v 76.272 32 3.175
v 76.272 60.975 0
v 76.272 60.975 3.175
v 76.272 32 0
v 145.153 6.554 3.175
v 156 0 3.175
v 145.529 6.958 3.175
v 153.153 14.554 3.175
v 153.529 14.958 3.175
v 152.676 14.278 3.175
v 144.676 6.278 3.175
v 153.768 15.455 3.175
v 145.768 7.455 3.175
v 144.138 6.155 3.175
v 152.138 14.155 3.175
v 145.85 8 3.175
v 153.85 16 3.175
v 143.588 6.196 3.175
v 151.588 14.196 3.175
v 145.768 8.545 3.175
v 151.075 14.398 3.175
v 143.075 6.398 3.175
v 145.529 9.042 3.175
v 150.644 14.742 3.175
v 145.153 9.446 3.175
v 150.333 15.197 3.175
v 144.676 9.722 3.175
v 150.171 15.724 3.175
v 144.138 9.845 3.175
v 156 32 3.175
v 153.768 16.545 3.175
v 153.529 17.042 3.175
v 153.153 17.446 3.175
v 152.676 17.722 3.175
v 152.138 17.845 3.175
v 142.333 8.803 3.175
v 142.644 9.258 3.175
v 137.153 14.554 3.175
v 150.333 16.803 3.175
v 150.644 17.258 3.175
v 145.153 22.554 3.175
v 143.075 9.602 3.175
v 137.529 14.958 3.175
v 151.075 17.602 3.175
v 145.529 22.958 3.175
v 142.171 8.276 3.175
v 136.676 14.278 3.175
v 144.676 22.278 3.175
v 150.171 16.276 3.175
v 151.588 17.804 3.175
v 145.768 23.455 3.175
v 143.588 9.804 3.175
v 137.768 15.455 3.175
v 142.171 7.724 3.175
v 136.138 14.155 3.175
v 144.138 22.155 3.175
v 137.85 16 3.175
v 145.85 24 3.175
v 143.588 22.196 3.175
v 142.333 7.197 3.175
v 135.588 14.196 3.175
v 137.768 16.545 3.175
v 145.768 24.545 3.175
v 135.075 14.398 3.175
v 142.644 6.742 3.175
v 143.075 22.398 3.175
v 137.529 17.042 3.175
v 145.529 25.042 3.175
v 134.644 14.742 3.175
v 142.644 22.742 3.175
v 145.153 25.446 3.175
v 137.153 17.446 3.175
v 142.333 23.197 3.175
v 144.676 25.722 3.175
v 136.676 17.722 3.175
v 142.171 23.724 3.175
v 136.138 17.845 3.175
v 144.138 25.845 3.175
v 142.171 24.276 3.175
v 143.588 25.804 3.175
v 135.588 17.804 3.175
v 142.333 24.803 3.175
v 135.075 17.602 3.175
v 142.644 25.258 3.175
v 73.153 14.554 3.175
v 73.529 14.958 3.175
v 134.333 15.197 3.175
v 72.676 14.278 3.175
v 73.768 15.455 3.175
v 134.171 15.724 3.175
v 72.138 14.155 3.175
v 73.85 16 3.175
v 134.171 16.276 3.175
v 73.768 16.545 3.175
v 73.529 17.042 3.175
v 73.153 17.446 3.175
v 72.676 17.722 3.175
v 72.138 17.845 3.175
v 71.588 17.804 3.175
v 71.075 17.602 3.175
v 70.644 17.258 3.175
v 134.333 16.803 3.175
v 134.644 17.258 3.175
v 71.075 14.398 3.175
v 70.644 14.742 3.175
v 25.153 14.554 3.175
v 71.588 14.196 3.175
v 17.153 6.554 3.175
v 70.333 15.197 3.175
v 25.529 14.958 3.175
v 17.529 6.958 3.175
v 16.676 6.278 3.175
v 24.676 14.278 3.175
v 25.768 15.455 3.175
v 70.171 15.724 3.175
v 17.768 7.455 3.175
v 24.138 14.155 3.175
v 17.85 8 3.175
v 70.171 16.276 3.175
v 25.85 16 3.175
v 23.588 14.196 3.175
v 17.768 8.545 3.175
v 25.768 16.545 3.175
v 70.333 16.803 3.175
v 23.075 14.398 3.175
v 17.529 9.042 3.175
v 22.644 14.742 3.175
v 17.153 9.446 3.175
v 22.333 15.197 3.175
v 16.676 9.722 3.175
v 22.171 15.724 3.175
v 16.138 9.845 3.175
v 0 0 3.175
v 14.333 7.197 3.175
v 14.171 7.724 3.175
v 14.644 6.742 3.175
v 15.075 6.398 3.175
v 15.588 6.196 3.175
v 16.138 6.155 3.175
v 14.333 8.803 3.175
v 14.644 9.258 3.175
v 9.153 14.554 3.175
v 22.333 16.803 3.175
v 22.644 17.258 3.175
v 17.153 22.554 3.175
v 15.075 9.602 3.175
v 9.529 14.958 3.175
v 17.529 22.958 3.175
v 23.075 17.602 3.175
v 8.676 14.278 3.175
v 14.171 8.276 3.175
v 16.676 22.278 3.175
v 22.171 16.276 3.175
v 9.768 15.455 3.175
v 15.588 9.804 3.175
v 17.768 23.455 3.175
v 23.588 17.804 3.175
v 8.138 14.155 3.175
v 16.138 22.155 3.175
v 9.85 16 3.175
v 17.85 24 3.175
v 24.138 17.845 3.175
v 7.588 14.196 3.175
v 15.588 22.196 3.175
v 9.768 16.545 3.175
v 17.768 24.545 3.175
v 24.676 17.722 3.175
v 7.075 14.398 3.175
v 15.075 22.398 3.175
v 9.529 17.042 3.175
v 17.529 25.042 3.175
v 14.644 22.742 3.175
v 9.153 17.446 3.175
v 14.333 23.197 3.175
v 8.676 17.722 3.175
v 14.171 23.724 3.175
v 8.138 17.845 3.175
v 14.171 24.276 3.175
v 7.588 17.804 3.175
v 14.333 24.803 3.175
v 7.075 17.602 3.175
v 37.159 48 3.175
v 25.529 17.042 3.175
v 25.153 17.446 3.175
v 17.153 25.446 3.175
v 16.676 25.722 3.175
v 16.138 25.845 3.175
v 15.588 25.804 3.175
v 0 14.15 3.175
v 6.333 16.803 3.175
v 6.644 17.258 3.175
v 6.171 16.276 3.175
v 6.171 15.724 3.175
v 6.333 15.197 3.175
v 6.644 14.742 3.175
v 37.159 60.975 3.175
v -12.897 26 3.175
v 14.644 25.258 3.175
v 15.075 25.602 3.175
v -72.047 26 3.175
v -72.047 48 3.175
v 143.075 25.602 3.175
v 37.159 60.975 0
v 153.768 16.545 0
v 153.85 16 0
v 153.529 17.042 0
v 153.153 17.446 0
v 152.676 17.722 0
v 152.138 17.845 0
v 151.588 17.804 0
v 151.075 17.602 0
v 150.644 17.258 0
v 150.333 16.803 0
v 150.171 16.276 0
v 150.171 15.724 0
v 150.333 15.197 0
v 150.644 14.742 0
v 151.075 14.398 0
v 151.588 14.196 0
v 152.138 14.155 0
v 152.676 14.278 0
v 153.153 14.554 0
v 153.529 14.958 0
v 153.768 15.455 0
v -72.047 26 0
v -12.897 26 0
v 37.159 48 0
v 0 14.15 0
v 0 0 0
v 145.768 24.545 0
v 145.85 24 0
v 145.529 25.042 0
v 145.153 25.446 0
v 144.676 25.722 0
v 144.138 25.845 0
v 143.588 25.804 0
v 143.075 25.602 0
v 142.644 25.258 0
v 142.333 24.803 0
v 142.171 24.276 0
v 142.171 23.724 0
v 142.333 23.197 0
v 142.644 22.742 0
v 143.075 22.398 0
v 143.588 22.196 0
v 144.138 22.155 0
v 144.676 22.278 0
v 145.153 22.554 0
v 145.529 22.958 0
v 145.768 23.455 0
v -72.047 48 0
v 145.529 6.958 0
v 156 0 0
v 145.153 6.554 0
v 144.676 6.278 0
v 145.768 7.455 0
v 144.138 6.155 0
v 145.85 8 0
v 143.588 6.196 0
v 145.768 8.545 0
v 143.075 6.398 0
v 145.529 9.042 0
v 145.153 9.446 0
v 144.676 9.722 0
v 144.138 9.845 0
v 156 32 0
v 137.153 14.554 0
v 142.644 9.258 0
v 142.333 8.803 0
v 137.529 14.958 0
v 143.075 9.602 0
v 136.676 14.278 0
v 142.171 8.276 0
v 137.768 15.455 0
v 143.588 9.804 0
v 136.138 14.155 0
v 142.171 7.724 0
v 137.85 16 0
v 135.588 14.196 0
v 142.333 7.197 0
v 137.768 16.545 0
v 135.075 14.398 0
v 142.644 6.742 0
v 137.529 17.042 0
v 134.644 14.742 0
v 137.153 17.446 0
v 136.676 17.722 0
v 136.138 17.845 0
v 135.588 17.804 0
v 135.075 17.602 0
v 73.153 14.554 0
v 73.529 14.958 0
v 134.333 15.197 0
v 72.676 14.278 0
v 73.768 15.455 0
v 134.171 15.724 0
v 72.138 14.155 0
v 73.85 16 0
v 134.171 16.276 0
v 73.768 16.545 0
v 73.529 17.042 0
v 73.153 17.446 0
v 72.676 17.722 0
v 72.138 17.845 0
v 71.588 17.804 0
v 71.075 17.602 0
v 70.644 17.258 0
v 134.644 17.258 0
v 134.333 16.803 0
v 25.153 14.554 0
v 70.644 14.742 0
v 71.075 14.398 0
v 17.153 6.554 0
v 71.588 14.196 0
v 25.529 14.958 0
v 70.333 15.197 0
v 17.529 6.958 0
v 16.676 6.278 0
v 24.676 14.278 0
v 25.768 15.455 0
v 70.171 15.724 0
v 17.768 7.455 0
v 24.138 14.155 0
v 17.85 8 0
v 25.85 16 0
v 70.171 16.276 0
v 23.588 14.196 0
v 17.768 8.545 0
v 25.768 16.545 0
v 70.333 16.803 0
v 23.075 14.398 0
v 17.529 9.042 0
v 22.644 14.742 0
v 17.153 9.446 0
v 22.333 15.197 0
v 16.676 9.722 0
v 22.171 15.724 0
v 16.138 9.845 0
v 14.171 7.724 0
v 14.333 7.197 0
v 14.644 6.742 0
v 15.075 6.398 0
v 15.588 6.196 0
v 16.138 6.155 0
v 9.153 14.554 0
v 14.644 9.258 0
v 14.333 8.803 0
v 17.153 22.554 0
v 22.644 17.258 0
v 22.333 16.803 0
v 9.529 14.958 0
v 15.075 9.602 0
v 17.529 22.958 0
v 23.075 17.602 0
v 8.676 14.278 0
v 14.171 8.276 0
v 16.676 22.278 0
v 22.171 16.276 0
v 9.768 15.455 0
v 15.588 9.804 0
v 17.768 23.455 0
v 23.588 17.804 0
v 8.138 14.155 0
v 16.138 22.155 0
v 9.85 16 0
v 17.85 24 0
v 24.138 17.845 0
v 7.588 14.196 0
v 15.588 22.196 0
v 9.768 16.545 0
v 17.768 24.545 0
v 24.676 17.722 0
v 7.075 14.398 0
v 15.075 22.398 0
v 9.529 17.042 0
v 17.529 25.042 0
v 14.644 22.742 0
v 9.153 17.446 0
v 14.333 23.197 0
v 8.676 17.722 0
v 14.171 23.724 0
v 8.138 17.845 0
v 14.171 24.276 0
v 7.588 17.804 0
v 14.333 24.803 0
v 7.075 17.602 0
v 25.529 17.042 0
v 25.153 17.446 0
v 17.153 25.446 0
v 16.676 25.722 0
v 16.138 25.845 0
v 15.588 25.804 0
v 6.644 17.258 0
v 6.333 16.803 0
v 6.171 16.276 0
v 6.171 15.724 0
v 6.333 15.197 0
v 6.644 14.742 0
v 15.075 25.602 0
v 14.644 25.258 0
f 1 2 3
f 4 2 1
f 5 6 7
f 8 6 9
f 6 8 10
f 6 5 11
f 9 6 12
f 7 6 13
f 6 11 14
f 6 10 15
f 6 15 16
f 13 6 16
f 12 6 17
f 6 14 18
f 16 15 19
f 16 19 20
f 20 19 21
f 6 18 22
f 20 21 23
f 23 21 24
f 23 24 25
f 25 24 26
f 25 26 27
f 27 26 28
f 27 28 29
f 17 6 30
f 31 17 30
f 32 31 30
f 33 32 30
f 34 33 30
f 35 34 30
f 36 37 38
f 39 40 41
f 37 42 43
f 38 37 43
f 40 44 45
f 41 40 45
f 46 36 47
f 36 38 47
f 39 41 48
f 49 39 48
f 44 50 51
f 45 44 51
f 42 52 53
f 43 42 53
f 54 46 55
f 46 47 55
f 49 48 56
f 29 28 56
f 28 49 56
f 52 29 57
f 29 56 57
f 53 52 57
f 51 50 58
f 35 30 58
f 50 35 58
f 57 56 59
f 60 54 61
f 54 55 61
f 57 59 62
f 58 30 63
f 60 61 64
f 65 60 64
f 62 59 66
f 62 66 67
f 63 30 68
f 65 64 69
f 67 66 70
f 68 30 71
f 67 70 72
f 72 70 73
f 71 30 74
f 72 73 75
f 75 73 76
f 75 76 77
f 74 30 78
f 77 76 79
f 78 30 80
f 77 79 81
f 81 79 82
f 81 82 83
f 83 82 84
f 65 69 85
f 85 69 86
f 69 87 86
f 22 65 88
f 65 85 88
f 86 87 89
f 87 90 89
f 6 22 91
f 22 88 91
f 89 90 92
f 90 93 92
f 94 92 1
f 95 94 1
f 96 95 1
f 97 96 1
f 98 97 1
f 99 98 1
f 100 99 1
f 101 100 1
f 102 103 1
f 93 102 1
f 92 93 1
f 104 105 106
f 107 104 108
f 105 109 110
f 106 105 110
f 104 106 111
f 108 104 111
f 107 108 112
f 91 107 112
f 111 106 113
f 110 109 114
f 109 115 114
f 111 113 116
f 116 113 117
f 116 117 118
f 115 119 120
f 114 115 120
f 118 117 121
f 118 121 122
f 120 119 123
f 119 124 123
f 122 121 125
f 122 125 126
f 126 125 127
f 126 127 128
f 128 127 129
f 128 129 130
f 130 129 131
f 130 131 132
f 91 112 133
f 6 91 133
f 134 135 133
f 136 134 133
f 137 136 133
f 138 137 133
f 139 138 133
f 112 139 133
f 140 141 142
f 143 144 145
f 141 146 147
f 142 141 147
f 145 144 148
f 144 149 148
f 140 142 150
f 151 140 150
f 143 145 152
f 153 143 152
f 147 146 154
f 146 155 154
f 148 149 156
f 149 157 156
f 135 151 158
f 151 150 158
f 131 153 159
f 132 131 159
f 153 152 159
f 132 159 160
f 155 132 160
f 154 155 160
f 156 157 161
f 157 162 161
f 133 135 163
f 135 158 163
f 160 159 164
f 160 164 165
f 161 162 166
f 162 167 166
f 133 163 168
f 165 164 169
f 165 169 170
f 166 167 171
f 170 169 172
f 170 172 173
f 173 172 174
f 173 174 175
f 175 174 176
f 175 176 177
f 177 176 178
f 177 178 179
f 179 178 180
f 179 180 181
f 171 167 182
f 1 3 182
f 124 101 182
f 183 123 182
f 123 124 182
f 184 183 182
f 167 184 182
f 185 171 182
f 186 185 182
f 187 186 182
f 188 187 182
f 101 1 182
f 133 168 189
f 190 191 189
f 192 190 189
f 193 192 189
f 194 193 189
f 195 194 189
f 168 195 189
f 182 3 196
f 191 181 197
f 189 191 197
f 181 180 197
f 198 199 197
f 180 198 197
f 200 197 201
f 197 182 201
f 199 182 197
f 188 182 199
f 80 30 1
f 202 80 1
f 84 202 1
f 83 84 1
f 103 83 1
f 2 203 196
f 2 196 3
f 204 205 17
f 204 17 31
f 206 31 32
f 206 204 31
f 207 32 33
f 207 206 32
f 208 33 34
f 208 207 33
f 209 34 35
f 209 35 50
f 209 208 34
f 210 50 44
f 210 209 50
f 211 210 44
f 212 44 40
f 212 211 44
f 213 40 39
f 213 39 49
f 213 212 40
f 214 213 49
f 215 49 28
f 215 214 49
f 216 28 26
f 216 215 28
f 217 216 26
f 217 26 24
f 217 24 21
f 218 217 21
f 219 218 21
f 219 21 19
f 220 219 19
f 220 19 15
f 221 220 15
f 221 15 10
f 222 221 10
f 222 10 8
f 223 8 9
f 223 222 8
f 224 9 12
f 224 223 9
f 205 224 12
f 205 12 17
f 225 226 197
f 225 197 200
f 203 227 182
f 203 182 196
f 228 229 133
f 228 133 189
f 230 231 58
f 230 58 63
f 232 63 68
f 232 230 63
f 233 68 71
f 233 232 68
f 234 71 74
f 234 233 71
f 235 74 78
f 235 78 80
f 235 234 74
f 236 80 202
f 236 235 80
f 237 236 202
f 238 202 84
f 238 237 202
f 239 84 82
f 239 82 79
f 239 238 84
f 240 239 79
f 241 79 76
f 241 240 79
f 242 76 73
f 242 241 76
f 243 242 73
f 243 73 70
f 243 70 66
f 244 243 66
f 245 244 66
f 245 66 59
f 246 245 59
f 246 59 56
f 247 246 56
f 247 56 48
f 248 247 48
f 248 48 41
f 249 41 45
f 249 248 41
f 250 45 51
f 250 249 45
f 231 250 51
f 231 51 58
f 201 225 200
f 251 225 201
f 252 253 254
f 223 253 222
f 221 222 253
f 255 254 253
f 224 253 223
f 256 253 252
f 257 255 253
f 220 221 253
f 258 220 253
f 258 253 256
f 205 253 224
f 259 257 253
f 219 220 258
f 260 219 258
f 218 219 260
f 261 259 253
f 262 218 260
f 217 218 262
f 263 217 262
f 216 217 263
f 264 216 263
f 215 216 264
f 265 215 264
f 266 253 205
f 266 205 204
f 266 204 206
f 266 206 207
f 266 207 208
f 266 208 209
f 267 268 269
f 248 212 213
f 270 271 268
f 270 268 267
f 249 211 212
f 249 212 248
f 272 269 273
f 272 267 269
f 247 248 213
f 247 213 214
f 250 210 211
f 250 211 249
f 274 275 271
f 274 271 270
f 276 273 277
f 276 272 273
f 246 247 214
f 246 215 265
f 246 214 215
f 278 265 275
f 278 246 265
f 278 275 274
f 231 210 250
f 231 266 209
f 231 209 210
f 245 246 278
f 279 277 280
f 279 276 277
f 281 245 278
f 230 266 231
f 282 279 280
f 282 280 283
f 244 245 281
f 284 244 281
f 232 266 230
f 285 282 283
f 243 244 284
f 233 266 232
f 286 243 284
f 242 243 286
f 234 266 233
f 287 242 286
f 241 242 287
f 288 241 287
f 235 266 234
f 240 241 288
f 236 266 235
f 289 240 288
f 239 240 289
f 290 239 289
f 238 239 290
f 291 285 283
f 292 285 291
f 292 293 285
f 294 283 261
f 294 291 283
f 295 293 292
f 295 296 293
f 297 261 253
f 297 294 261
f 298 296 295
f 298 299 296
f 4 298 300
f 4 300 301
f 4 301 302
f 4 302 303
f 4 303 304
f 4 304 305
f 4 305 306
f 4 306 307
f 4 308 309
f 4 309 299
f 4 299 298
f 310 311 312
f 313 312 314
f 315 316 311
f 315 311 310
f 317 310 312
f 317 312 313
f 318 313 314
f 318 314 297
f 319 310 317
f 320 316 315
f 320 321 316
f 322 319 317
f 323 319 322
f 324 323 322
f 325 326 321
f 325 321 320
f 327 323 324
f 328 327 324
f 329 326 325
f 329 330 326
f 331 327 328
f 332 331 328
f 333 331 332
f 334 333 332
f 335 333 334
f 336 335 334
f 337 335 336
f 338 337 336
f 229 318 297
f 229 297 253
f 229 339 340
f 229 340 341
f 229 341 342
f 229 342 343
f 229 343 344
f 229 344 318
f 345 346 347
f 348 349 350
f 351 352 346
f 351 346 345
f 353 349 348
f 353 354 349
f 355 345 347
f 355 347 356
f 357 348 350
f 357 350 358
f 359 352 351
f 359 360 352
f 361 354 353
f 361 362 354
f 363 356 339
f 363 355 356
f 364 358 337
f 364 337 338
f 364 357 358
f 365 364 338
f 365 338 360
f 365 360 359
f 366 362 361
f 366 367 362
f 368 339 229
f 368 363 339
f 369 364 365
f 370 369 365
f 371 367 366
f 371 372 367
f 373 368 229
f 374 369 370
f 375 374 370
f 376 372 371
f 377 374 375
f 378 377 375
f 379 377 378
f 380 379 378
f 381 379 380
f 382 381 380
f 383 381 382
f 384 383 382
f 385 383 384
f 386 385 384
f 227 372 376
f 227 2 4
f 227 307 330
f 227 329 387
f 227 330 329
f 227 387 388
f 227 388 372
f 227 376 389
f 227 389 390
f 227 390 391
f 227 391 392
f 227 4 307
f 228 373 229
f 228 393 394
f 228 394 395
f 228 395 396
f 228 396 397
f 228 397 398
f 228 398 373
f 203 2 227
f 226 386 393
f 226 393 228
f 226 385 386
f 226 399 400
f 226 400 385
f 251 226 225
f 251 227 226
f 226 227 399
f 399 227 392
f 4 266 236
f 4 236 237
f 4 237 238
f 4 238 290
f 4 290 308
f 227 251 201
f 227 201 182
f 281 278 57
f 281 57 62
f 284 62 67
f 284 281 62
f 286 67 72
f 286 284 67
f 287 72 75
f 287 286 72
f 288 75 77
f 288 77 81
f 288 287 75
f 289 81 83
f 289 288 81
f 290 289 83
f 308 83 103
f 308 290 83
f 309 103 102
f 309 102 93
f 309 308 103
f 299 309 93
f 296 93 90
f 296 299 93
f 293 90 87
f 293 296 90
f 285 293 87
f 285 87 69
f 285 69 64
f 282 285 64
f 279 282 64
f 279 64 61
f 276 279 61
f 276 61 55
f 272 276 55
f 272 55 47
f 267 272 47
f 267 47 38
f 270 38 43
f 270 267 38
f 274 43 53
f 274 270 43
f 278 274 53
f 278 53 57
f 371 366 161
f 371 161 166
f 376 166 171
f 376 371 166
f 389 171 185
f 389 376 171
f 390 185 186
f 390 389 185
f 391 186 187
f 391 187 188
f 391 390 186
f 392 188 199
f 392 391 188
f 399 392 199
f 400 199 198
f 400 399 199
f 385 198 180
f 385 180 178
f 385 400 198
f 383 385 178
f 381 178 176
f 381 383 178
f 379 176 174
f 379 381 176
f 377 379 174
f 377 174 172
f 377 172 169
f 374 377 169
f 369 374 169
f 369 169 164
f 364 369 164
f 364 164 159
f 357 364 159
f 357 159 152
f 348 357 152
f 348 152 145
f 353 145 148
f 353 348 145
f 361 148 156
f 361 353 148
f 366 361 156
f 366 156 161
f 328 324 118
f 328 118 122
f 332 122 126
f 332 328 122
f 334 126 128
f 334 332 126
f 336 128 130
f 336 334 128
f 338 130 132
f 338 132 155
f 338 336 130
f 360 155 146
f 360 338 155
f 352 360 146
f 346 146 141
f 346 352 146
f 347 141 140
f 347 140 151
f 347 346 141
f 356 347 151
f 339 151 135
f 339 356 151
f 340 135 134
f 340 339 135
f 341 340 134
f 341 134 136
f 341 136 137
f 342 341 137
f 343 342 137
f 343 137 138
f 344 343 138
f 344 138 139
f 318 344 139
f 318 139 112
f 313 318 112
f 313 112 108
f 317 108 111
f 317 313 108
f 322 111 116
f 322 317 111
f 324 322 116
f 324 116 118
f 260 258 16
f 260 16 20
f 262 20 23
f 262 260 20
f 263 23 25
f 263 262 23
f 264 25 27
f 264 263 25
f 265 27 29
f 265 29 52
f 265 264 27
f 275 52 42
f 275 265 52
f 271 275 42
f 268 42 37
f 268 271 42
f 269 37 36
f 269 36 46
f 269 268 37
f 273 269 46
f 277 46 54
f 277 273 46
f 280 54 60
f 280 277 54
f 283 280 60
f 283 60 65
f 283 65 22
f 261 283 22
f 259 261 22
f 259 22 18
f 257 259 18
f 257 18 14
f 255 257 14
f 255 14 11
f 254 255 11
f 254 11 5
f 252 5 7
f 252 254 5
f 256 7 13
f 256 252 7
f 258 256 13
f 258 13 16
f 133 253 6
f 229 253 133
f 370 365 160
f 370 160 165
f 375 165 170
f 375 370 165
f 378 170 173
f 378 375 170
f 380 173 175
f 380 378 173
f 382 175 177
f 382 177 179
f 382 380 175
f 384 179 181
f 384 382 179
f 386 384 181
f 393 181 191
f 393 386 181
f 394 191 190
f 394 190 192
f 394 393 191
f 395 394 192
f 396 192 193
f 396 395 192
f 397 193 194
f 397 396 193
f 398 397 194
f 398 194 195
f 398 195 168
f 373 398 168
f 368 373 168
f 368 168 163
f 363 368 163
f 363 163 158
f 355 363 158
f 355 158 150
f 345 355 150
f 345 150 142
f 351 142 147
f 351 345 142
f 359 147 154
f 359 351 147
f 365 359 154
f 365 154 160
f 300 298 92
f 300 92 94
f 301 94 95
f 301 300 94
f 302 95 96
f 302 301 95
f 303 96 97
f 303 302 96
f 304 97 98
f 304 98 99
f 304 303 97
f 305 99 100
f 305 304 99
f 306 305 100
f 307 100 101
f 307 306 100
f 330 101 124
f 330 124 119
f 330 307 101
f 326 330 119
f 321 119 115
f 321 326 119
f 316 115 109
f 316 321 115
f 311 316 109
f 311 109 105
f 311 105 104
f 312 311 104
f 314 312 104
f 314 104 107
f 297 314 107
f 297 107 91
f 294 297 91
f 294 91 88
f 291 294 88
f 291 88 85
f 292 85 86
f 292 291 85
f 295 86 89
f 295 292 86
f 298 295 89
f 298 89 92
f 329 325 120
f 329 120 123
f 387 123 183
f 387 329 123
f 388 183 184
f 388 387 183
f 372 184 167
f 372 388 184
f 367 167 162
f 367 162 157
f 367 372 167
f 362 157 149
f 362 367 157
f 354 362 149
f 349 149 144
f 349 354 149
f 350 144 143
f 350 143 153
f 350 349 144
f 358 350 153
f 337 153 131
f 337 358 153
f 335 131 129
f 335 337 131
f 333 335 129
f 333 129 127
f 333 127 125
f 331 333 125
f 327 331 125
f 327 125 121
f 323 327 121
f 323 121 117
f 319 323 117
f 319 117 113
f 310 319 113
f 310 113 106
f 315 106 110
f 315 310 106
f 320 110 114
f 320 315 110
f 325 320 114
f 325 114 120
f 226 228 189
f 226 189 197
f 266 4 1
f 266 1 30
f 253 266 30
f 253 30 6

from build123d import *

# Parameters (mm, degrees)
SKETCH1_R           = 1.85
BOSS_EXTRUDE1_DEPTH = 3.175


with BuildPart() as part:
    # Sketch1 → Boss-Extrude1 (new body)
    with BuildSketch(Plane.XY):
        Polygon((156, 0), (0, 0), (0, 14.15), (-12.897437159, 26), (-72.0466, 26), (-72.0466, 48), (37.159, 48), (37.159, 60.975), (76.2722, 60.975), (76.2722, 32), (156, 32), align=None)
        with Locations((144, 8)):
            Circle(SKETCH1_R, mode=Mode.SUBTRACT)
        with Locations((144, 24)):
            Circle(SKETCH1_R, mode=Mode.SUBTRACT)
        with Locations((152, 16)):
            Circle(SKETCH1_R, mode=Mode.SUBTRACT)
        with Locations((136, 16)):
            Circle(SKETCH1_R, mode=Mode.SUBTRACT)
        with Locations((24, 16)):
            Circle(SKETCH1_R, mode=Mode.SUBTRACT)
        with Locations((16, 8)):
            Circle(SKETCH1_R, mode=Mode.SUBTRACT)
        with Locations((8, 16)):
            Circle(SKETCH1_R, mode=Mode.SUBTRACT)
        with Locations((16, 24)):
            Circle(SKETCH1_R, mode=Mode.SUBTRACT)
        with Locations((72, 16)):
            Circle(SKETCH1_R, mode=Mode.SUBTRACT)
    extrude(amount=BOSS_EXTRUDE1_DEPTH)


solid = part.part
